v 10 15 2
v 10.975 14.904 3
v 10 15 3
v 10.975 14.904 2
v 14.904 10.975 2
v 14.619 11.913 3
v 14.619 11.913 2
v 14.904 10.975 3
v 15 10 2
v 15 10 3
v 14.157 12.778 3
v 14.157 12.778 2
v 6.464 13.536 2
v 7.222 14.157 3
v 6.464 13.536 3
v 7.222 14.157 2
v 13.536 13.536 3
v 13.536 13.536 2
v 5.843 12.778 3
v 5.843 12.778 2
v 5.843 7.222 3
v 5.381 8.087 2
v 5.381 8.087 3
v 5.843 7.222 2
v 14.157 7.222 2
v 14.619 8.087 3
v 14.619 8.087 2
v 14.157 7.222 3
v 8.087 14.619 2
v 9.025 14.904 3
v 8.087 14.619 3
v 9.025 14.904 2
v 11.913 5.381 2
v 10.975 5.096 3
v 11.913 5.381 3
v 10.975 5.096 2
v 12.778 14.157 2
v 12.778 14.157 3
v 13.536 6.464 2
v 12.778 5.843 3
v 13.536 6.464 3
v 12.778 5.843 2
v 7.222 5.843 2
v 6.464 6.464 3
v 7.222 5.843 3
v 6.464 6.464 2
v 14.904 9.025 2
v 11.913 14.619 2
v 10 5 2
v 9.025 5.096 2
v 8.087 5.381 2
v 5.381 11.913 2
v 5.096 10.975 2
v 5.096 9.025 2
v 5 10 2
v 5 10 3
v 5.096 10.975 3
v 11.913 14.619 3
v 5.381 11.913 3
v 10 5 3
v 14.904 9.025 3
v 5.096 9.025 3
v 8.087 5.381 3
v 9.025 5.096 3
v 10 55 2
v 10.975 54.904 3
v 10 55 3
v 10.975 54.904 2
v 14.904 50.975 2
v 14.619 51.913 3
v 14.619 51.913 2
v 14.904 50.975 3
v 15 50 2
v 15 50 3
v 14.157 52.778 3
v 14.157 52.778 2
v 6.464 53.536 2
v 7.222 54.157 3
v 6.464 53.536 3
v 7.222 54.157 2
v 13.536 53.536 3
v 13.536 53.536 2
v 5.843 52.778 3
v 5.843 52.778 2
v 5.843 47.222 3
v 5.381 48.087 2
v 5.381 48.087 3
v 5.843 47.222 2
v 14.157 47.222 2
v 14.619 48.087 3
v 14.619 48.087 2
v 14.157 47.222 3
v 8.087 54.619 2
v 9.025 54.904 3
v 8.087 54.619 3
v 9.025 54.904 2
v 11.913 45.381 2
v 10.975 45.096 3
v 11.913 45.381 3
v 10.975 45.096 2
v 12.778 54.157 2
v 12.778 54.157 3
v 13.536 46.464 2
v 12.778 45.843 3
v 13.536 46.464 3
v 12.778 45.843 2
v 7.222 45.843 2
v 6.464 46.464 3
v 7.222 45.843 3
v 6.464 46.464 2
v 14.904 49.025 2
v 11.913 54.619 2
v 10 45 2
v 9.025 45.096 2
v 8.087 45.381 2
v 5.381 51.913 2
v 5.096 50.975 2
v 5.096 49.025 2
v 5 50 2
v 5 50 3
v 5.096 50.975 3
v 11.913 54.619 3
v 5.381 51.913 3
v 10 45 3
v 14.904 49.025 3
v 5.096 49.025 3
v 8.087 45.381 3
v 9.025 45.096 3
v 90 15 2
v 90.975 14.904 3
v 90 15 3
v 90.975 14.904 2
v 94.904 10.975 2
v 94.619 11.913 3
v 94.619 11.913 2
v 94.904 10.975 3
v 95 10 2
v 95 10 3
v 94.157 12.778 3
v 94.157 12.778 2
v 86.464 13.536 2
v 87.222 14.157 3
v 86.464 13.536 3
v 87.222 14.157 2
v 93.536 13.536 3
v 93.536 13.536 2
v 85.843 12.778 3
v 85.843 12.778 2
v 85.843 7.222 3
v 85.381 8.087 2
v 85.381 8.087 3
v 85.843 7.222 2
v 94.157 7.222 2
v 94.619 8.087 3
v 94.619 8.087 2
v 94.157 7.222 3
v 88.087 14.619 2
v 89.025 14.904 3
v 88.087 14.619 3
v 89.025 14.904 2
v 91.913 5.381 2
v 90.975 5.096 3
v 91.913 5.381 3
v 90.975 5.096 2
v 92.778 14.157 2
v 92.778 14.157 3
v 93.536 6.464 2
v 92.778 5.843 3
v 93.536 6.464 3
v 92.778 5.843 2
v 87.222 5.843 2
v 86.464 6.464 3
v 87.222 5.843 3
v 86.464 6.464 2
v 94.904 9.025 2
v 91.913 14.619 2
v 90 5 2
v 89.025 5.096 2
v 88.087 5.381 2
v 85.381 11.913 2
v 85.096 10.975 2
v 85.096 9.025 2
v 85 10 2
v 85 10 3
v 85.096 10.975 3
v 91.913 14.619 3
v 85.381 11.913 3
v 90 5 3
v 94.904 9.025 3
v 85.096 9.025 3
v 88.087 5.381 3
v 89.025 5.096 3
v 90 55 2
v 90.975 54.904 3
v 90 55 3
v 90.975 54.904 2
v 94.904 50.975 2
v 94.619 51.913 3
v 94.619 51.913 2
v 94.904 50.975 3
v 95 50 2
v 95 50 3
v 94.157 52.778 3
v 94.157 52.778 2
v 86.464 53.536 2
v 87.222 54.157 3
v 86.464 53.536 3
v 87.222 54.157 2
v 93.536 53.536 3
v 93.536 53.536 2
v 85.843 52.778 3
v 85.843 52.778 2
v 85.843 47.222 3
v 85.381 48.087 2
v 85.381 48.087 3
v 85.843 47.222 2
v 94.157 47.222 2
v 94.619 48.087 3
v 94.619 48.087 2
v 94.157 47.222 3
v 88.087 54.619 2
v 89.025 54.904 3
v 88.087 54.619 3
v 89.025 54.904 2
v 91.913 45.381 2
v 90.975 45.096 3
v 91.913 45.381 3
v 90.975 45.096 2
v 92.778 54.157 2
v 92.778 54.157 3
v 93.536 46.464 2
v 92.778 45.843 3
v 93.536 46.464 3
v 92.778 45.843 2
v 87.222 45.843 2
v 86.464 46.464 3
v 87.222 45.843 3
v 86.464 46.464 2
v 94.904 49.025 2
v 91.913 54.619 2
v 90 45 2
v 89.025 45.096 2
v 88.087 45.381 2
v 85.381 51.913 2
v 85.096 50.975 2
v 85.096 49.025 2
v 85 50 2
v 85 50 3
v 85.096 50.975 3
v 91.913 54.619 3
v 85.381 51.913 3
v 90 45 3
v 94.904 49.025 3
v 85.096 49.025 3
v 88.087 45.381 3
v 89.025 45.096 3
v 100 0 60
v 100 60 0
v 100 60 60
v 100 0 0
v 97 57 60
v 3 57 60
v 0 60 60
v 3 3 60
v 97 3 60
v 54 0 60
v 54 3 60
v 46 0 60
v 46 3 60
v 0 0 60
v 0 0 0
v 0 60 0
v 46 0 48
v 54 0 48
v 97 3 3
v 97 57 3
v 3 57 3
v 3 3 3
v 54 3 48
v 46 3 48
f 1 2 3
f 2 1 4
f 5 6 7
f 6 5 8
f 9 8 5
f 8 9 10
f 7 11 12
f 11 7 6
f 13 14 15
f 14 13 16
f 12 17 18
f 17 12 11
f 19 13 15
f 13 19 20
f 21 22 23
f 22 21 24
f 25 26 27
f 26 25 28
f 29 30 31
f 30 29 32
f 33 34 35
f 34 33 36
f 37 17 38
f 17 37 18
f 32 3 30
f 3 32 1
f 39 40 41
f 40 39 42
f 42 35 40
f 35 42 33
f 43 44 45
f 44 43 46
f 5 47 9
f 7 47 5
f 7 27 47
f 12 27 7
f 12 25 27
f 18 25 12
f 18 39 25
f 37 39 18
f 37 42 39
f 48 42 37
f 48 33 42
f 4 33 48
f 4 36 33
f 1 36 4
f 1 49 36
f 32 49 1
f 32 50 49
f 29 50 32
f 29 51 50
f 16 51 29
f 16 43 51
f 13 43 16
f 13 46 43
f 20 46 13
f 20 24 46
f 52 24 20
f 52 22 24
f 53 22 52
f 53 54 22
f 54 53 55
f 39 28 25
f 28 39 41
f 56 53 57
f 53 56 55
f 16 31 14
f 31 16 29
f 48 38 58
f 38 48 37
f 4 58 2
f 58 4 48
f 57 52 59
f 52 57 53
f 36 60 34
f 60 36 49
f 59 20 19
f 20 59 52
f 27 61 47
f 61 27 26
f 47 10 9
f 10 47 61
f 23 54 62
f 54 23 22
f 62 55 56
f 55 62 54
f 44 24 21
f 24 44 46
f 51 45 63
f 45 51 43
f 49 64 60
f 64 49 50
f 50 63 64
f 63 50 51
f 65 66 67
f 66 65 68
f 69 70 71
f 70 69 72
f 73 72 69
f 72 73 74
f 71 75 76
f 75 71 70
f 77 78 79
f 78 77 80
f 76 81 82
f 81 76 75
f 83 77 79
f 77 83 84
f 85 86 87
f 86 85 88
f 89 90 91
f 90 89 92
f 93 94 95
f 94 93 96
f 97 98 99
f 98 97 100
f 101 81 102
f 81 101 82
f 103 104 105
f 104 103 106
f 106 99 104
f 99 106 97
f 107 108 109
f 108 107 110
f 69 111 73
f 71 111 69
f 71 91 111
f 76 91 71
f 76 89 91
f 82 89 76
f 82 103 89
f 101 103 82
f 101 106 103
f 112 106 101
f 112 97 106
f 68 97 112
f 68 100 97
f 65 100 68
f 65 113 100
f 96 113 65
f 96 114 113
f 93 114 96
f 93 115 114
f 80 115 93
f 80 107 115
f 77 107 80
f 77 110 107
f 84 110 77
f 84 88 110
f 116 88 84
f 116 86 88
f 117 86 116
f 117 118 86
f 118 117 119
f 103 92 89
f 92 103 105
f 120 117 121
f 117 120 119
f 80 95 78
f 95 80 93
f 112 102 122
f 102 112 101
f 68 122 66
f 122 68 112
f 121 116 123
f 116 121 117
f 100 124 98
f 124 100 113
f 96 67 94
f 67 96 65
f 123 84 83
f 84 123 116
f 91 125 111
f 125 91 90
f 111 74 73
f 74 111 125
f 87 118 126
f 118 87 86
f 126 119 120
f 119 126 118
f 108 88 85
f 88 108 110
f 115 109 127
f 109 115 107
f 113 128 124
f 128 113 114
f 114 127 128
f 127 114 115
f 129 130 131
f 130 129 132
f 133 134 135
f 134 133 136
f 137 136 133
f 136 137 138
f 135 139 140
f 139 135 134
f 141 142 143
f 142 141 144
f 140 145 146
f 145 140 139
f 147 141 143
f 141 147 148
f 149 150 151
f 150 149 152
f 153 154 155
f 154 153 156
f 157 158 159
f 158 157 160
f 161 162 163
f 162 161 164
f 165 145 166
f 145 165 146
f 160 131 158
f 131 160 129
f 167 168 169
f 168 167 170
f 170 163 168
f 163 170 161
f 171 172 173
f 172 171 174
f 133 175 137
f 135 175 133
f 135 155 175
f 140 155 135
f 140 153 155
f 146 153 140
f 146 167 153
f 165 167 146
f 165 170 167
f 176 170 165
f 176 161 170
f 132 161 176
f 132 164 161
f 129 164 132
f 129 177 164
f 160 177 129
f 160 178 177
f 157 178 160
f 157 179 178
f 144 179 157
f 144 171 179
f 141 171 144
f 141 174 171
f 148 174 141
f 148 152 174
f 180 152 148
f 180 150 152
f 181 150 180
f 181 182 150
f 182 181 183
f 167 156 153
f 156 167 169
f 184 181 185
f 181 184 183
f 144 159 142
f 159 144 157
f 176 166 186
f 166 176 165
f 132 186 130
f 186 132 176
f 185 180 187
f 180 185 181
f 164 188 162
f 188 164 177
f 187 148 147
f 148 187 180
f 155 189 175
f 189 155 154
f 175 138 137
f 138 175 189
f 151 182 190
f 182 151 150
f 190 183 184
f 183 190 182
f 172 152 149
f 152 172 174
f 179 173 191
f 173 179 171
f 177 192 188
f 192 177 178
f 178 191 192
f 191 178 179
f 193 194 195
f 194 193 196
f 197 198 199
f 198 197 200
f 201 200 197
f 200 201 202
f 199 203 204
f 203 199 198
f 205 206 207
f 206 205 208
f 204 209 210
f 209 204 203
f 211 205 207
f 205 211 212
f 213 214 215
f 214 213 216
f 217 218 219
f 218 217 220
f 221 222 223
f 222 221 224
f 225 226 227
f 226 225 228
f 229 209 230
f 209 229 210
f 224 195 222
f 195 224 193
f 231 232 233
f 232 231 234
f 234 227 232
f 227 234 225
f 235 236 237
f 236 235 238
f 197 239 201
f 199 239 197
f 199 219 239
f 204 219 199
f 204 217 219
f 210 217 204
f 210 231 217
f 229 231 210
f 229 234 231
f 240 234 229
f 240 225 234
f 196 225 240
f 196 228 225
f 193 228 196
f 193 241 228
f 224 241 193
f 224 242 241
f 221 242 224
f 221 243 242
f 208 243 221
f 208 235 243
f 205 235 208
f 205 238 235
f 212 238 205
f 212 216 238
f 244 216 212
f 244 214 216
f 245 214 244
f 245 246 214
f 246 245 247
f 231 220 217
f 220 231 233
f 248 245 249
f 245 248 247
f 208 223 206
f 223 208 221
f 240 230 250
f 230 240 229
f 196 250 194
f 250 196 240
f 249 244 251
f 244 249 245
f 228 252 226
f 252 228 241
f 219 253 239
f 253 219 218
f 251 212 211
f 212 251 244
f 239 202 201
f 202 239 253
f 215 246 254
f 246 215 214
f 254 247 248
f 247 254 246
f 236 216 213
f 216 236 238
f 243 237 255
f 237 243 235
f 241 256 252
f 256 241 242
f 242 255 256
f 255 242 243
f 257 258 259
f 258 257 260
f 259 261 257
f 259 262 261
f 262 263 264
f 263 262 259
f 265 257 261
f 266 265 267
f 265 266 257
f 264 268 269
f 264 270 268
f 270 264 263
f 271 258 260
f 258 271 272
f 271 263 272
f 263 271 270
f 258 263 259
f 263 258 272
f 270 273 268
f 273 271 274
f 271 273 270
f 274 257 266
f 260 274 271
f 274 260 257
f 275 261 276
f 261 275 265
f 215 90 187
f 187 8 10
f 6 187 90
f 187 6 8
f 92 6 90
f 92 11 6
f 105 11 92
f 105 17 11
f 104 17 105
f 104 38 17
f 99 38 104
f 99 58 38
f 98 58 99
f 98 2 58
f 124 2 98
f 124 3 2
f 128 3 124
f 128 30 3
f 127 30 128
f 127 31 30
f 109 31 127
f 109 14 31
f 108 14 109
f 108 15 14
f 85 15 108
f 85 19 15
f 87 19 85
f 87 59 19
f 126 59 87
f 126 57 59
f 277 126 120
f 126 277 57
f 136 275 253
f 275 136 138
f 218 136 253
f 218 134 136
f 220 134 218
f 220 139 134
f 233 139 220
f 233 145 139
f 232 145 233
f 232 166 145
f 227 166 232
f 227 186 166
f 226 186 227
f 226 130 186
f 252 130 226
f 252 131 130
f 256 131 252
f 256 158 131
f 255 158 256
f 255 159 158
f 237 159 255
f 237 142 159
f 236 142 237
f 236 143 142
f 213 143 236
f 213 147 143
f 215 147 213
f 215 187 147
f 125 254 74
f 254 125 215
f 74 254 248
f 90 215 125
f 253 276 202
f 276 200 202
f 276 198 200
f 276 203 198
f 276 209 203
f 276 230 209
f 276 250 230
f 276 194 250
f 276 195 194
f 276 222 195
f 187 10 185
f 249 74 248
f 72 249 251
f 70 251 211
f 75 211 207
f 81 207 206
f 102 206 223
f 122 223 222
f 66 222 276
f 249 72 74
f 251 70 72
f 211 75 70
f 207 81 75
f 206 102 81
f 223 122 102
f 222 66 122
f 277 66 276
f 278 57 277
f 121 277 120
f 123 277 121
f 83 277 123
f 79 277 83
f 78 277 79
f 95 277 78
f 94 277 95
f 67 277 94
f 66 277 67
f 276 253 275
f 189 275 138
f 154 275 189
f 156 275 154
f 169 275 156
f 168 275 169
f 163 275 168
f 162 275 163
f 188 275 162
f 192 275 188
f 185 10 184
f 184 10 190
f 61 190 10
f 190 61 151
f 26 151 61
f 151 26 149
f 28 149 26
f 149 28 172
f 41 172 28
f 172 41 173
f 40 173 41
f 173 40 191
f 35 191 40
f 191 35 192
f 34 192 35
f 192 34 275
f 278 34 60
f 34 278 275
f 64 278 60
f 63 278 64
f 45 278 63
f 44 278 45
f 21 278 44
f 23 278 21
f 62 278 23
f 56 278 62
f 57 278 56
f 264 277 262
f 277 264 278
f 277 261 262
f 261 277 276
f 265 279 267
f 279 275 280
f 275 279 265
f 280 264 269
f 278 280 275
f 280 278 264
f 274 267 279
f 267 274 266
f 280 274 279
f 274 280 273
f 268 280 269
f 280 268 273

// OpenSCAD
$fn = 32;

// ----------------------------------------------------------------------
// Enclosure box: both enclosure
// ----------------------------------------------------------------------

// --- parameters (mm) ---
box_l = 100;              // outer length, X
box_w = 60;               // outer width, Y
box_h = 60;               // outer height
wall_t = 3;               // wall thickness
boss_r = 5;               // corner boss radius
hole_r = 2;               // boss screw hole radius
boss_in = 10;             // boss inset from the corners
notch_w = 8;              // cable notch width
notch_h = 12;             // cable notch height

inner_h = box_h - wall_t;  // cavity depth
boss_h = inner_h - 2;  // corner boss height

difference() {
  cube([box_l, box_w, box_h]);
  translate([wall_t, wall_t, wall_t])
    cube([box_l - 2 * wall_t, box_w - 2 * wall_t, box_h]);
  for (sx = [0, 1], sy = [0, 1])
    translate([sx ? box_l - boss_in : boss_in,
               sy ? box_w - boss_in : boss_in, wall_t - 1]) {
      cylinder(r = boss_r, h = boss_h);
      translate([0, 0, boss_h - 4])
        cylinder(r = hole_r, h = 5);
    }
  translate([box_l / 2 - notch_w / 2, -1, box_h - notch_h])
    cube([notch_w, wall_t + 2, notch_h + 1]);
}
